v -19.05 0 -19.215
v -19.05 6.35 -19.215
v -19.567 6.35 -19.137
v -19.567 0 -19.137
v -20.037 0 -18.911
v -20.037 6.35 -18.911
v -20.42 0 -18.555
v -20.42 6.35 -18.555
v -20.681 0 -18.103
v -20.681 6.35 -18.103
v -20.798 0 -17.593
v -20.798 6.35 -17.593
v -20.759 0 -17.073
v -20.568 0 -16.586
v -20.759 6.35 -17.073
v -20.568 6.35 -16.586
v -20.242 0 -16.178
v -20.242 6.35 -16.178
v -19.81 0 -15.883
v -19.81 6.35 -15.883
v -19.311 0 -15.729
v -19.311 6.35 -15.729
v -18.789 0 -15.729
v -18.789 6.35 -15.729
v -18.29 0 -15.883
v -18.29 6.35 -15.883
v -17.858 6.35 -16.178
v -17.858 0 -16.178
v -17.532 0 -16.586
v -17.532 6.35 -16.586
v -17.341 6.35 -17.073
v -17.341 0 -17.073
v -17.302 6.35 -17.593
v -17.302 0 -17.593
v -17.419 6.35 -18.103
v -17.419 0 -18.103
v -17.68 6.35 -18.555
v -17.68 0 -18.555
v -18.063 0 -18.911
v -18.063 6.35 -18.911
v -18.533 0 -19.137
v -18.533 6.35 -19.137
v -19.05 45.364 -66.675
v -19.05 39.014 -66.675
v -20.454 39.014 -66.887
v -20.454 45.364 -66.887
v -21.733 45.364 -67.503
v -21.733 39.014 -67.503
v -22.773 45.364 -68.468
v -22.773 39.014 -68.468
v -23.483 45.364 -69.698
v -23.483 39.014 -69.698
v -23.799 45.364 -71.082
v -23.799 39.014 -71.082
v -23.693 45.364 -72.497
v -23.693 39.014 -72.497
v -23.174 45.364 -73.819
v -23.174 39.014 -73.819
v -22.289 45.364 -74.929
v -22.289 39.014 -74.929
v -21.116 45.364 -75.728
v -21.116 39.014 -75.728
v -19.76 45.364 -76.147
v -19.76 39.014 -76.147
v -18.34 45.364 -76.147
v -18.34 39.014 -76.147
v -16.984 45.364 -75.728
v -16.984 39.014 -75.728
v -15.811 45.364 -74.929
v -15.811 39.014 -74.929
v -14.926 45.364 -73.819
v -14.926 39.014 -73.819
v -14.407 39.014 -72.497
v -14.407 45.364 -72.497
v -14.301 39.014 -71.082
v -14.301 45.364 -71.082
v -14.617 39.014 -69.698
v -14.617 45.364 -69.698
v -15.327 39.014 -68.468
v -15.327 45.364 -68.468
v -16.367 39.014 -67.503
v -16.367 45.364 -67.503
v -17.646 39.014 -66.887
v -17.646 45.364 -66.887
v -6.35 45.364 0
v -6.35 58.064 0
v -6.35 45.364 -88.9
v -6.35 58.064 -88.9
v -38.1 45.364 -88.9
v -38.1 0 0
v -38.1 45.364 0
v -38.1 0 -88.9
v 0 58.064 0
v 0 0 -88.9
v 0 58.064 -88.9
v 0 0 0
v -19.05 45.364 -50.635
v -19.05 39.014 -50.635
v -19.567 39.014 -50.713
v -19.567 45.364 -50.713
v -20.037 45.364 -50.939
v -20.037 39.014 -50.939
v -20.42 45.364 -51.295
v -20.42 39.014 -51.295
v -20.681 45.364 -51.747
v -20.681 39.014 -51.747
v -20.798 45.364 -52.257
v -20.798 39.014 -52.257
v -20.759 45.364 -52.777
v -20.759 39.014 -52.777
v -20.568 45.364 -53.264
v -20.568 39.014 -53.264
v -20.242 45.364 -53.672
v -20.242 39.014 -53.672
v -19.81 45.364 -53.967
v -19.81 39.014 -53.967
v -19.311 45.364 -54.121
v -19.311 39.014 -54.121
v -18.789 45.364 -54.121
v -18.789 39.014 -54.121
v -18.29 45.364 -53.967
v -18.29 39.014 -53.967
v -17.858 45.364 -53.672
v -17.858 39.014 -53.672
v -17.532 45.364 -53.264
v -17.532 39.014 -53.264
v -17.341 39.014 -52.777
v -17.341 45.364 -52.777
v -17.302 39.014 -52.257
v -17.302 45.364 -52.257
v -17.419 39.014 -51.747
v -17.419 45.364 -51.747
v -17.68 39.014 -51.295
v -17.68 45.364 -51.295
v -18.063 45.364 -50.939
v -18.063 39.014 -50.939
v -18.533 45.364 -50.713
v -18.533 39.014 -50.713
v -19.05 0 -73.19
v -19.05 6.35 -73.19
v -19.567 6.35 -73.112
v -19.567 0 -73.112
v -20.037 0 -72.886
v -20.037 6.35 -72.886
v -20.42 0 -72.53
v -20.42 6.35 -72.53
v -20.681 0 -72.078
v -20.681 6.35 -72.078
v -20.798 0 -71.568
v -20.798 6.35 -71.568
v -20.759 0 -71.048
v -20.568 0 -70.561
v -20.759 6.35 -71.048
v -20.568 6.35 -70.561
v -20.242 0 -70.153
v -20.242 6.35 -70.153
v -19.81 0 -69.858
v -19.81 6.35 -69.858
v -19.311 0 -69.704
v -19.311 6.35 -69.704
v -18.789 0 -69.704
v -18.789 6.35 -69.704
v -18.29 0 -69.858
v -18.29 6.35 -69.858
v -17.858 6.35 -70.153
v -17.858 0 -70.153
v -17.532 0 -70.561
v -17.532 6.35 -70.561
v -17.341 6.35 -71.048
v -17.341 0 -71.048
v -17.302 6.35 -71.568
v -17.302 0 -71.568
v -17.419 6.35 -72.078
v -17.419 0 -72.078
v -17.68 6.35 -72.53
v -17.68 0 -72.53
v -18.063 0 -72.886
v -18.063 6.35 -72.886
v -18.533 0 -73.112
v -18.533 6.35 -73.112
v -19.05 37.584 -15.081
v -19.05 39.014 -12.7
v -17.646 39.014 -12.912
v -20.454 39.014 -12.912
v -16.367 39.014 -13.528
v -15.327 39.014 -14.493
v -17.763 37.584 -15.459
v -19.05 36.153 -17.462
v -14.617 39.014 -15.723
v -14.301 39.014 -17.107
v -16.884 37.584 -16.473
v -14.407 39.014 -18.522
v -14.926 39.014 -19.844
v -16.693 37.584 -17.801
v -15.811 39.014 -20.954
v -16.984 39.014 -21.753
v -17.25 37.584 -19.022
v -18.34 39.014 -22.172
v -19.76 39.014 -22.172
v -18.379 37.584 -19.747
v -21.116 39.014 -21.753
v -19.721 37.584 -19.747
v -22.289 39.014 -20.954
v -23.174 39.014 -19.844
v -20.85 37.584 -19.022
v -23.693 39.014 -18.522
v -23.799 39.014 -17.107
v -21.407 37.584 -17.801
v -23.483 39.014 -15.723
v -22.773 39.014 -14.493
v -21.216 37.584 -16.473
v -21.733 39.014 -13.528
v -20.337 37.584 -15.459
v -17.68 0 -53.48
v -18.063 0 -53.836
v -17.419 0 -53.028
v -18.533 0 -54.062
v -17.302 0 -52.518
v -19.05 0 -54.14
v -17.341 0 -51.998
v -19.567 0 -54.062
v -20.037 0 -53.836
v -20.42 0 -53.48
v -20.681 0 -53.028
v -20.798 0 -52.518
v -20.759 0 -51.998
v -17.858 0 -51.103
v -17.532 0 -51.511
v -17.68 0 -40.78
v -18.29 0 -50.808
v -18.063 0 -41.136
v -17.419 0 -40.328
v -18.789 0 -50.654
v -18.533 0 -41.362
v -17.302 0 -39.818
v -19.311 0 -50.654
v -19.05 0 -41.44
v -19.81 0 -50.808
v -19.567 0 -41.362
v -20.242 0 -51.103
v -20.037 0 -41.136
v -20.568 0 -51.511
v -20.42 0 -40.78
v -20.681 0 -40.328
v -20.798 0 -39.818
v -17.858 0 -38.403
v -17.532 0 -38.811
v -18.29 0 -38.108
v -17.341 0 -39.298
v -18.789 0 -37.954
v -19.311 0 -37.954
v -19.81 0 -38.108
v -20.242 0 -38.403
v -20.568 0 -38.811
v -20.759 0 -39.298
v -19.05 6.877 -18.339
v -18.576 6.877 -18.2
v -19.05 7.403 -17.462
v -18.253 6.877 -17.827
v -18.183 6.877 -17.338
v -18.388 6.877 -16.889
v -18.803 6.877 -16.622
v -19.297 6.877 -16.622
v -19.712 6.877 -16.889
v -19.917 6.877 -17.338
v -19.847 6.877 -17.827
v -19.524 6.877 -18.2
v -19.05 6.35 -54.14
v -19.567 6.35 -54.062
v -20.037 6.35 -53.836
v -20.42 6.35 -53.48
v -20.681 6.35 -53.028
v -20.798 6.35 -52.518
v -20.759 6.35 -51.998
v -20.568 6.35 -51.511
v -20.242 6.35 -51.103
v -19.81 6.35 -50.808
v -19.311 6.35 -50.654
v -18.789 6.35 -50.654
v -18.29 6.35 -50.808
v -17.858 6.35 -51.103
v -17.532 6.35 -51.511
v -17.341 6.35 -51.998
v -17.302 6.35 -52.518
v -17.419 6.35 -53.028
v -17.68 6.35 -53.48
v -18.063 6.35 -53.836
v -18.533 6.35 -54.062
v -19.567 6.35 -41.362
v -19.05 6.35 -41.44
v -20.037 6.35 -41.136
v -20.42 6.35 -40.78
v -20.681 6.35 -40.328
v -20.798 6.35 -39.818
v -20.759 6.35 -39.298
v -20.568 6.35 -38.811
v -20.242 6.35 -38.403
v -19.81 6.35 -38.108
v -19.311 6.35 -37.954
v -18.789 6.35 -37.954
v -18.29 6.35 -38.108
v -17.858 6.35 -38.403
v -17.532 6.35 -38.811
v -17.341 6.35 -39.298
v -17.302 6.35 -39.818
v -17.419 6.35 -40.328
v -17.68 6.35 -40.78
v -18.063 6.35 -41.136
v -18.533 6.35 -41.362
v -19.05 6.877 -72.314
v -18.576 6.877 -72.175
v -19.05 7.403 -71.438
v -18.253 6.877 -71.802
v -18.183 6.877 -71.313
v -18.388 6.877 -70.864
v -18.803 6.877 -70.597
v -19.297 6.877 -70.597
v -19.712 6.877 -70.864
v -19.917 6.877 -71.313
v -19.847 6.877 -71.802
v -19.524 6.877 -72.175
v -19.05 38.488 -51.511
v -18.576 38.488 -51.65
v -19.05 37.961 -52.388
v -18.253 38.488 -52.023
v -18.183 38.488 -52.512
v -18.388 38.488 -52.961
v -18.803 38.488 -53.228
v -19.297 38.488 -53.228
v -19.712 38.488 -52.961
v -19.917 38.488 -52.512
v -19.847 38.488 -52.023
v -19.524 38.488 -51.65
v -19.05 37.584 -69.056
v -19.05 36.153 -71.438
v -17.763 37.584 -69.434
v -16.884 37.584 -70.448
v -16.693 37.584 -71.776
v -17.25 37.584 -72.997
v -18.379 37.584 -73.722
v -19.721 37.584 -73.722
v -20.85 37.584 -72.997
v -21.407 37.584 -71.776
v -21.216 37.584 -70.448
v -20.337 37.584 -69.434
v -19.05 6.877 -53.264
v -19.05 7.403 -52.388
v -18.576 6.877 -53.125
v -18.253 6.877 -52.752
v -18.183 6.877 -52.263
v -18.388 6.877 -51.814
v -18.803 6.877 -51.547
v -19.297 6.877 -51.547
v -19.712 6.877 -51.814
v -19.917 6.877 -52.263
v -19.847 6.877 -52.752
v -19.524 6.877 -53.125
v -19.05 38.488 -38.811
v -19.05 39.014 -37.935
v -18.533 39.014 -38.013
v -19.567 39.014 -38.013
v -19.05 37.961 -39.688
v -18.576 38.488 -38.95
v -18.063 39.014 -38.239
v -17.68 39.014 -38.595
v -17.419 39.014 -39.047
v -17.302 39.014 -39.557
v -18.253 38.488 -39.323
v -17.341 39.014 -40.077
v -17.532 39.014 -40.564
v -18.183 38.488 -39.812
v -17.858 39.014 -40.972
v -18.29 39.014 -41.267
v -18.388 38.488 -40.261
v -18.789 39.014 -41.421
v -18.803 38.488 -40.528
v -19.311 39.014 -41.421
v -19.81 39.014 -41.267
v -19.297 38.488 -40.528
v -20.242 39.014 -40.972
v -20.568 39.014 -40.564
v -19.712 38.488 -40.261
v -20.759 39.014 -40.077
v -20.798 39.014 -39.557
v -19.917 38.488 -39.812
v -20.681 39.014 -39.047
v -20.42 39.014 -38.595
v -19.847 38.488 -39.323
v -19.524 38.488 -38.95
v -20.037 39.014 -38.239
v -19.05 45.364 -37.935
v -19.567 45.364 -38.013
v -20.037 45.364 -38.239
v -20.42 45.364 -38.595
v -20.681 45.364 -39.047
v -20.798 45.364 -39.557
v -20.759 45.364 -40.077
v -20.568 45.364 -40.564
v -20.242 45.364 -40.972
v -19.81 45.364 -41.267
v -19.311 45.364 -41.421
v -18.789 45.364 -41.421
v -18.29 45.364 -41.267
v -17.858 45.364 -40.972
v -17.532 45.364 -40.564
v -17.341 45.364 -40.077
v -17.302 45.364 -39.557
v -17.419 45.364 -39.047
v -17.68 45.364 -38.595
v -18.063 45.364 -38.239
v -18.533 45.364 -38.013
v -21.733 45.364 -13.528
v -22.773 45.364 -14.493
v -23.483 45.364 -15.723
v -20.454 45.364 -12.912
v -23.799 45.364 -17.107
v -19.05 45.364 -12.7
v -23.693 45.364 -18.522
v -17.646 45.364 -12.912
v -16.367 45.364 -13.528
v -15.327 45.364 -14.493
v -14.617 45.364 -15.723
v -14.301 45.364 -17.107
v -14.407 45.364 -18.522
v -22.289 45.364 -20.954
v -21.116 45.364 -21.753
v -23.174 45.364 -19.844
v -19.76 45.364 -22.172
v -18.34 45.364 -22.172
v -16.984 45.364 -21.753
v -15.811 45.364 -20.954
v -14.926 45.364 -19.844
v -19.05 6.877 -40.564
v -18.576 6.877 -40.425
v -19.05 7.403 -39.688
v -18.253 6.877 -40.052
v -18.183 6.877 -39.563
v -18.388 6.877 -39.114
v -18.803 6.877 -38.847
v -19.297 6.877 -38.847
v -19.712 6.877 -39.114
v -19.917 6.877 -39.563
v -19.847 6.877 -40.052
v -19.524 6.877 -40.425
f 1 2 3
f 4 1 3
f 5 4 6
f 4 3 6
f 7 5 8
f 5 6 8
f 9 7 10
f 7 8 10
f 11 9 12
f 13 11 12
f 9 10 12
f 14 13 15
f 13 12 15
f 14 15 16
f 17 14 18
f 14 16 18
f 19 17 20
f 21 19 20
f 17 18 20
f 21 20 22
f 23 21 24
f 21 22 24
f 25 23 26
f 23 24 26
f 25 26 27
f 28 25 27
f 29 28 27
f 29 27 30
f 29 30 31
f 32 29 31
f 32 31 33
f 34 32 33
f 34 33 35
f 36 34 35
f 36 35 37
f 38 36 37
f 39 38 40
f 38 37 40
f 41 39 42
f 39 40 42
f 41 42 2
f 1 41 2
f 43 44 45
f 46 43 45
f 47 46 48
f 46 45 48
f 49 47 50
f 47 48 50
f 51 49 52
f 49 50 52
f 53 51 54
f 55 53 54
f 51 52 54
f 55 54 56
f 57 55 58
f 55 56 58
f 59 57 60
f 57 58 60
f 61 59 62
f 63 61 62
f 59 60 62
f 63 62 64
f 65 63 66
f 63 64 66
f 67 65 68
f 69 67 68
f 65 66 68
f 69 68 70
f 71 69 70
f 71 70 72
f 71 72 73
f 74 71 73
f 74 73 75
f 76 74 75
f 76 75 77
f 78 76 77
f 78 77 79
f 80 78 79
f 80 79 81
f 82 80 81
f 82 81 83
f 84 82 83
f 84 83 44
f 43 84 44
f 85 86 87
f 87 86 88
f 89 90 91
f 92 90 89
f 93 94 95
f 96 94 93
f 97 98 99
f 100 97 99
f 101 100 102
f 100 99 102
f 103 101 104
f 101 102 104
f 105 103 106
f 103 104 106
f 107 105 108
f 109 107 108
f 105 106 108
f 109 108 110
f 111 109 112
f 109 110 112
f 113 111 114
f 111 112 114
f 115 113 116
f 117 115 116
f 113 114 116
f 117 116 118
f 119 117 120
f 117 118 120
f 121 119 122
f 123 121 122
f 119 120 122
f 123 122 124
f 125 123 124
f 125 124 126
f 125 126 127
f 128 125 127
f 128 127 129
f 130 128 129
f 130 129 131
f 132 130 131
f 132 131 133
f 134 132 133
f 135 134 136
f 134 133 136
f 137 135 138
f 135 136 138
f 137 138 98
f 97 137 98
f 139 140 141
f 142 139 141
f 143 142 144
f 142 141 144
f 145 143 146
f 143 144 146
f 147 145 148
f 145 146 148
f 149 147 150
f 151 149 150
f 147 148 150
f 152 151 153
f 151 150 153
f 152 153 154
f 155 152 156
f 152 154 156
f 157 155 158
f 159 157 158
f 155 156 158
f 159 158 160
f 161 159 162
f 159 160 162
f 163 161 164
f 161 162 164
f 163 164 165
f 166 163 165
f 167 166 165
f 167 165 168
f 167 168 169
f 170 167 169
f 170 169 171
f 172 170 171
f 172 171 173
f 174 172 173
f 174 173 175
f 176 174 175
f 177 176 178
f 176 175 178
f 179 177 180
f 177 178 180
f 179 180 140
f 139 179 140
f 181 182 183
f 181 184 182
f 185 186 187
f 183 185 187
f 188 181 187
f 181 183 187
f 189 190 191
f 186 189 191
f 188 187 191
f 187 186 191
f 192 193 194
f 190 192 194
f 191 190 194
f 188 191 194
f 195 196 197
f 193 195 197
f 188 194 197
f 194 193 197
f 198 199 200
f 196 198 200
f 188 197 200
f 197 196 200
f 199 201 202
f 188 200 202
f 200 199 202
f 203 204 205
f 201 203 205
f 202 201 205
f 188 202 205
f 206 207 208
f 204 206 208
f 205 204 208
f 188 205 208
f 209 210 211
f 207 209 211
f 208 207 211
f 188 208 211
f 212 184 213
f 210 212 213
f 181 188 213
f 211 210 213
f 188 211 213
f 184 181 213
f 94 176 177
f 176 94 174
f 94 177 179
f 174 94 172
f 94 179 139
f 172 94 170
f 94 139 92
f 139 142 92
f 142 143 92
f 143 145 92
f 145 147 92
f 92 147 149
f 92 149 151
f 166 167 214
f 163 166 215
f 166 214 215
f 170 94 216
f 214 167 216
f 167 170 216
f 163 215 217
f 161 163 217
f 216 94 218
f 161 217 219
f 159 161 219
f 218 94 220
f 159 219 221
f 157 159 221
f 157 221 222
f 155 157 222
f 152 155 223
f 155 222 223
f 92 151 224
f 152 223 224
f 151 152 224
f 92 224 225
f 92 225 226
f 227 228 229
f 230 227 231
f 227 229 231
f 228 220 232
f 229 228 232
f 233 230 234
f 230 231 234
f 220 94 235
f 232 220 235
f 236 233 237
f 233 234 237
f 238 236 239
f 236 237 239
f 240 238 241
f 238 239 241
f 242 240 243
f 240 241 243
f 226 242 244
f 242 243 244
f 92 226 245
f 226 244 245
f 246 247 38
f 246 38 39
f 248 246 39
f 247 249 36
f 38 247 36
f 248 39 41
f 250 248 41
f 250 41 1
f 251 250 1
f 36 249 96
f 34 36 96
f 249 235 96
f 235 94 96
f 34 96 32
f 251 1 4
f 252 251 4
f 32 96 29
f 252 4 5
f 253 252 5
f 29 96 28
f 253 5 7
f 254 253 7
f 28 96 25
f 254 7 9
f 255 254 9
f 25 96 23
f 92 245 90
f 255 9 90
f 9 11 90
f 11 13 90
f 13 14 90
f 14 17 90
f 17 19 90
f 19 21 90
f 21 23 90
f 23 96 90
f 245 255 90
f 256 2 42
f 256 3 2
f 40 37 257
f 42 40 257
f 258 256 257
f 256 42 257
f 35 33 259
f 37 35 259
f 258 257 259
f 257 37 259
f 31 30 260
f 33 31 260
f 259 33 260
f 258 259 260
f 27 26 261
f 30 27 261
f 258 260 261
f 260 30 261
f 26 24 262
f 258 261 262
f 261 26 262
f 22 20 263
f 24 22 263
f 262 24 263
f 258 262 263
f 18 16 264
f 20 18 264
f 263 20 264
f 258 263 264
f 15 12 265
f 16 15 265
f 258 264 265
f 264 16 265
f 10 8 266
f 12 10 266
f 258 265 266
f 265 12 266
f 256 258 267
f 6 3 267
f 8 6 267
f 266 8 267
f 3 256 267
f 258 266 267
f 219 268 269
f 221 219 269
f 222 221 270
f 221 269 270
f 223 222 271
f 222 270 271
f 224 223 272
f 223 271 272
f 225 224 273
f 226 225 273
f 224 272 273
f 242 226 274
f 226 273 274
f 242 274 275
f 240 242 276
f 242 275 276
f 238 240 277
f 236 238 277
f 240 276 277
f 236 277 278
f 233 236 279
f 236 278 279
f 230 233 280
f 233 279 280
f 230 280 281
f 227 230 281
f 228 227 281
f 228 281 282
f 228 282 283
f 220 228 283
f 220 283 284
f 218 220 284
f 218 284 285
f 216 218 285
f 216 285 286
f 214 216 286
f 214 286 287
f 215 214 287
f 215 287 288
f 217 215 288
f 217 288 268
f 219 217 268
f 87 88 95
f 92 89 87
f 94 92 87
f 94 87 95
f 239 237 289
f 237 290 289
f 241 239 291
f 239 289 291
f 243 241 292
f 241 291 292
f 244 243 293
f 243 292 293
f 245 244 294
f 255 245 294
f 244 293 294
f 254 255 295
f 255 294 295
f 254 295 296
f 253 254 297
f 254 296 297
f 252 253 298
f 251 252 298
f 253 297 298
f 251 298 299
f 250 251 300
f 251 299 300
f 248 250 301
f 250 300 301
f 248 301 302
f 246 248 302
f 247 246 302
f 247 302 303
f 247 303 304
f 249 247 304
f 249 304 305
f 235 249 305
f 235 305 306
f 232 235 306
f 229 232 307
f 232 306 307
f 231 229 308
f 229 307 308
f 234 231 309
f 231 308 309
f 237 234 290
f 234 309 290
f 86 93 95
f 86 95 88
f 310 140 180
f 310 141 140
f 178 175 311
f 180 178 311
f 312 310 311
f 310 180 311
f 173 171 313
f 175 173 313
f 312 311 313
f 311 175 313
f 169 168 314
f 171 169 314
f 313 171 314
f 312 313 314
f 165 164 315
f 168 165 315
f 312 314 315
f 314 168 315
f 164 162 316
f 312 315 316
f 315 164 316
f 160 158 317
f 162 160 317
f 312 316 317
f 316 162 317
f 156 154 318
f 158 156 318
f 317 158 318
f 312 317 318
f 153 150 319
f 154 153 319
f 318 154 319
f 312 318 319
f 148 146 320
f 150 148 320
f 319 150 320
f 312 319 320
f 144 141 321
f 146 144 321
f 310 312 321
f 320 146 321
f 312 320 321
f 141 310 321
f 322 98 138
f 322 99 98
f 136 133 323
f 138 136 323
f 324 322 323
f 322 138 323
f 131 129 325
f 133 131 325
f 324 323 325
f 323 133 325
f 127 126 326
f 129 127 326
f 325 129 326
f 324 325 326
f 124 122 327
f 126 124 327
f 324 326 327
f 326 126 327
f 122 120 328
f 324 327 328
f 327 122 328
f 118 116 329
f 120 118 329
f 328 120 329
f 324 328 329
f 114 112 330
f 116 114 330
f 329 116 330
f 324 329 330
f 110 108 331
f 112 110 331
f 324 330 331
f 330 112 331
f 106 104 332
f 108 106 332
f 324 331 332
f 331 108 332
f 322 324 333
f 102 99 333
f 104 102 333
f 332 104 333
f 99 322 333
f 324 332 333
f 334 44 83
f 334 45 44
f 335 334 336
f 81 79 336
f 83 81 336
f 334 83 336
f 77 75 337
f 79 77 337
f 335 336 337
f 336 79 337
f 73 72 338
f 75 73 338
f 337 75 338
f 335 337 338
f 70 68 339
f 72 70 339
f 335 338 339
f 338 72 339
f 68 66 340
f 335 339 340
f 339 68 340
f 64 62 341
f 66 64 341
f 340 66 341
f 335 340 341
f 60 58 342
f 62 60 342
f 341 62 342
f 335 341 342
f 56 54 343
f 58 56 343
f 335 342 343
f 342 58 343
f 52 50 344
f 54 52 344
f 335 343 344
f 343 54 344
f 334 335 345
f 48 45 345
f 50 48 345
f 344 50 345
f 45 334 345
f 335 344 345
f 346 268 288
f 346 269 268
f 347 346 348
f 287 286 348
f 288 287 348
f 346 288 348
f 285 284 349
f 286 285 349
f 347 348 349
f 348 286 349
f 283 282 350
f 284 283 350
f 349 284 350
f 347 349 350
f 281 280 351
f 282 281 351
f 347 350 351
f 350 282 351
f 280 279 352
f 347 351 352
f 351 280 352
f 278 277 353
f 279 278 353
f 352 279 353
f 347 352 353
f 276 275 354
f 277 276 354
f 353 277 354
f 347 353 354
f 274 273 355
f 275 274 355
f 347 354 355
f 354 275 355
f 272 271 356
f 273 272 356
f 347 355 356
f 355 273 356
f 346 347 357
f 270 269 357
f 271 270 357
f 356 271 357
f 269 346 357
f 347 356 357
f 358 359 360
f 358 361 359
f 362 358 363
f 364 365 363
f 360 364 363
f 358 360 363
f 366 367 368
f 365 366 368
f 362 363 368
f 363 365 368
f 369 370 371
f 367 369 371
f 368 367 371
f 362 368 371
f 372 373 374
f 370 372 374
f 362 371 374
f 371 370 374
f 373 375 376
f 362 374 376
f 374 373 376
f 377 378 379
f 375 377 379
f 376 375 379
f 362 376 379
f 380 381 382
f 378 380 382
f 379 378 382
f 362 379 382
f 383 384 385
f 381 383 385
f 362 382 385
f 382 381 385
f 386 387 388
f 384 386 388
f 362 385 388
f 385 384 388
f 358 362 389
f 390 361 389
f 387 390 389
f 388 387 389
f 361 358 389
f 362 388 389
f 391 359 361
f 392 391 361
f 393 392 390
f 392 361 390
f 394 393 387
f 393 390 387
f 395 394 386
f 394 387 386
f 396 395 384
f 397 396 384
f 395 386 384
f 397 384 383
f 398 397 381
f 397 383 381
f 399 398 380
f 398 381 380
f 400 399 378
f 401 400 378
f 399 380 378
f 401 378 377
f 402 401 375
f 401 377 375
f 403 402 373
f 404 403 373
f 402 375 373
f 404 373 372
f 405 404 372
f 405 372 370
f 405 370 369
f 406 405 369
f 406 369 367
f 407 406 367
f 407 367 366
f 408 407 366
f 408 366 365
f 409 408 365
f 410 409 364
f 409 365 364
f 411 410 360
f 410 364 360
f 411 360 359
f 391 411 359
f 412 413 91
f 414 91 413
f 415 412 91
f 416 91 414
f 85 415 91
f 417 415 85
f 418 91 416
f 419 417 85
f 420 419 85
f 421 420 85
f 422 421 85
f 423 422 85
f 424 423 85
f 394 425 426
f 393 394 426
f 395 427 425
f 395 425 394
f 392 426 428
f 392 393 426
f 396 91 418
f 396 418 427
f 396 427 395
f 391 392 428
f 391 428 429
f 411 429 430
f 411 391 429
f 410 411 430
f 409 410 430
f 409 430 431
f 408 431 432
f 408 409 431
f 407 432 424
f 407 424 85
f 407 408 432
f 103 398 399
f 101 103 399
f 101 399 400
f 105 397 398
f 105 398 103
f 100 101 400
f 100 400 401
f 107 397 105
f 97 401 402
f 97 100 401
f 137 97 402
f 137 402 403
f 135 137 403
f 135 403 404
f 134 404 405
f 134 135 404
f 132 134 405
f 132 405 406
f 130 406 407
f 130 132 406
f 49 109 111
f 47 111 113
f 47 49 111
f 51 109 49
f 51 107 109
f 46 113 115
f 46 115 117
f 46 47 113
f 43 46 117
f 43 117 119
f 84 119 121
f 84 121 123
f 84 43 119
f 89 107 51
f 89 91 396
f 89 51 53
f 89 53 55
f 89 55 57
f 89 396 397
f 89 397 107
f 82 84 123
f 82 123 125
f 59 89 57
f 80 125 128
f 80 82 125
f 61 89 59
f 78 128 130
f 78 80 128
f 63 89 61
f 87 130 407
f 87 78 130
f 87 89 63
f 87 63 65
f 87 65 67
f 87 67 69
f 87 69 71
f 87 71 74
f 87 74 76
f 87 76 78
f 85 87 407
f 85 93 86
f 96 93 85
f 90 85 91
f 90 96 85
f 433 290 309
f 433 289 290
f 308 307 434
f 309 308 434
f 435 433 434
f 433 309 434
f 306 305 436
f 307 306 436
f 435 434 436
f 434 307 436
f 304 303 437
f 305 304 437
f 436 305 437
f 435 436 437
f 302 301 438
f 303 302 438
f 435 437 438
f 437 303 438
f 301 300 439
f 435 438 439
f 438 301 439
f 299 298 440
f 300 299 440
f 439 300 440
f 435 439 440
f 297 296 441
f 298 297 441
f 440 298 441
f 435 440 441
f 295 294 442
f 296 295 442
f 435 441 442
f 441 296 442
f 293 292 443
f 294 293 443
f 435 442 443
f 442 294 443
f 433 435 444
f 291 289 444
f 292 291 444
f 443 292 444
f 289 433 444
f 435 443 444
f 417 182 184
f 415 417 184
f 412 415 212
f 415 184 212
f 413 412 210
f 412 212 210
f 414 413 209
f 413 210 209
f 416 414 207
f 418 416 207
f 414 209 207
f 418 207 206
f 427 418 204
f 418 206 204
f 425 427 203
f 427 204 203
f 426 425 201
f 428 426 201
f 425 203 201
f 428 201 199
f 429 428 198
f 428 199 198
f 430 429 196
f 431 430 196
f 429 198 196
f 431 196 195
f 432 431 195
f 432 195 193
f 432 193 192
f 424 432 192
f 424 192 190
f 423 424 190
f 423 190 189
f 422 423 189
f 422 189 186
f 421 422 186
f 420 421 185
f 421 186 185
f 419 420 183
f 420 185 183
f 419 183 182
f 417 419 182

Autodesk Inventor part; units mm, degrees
ref_plane "YZ Plane" through (0, 0, 0) normal (1, 0, 0) x (0, 1, 0)
ref_plane "XZ Plane" through (0, 0, 0) normal (0, 1, 0) x (-1, 0, 0)
ref_plane "XY Plane" through (0, 0, 0) normal (0, 0, 1) x (1, 0, 0)
sketch "Sketch1" plane through (0, 0, 0) normal (0, 1, 0) x (-1, 0, 0)
  line L0 (0, 0) -> (38.1, 0)
  line L1 (38.1, 0) -> (38.1, -88.9)
  line L2 (38.1, -88.9) -> (0, -88.9)
  line L3 (0, -88.9) -> (0, 0)
  dimension "d0" = 88.9
  dimension "d1" = 38.1
extrude "Extrusion1" add sketch "Sketch1" along normal blind 58.0644
sketch "Sketch6" plane through (0, 58.0644, 0) normal (0, 1, 0) x (1, 0, 0)
  line L0 (-38.1, 0) -> (0, 0) projected
  line L1 (0, 0) -> (0, 88.9) projected
  line L2 (0, 88.9) -> (-38.1, 88.9) projected
  line L3 (-38.1, 88.9) -> (-38.1, 0) projected
  line L4 (-38.1, 0) -> (-6.35, 0)
  line L5 (-6.35, 0) -> (-6.35, 88.9)
  line L6 (-6.35, 88.9) -> (-38.1, 88.9)
  line L7 (-38.1, 88.9) -> (-38.1, 0)
  dimension "d38" = 0
  dimension "d39" = 31.75
  dimension "d40" = 0
  dimension "d41" = 88.9
extrude "Extrusion5" cut sketch "Sketch6" against normal blind 12.7 contours L3 L2 L5 L0
sketch "Sketch7" plane through (0, 45.3644, 0) normal (0, 1, 0) x (1, 0, 0)
  arc A0 (-20.2095, 23.7057) -> (-20.2095, 11.2193) centre (-19.05, 17.4625) ccw projected
  line L0 (-26.5557, 23.7057) -> (-20.2095, 23.7057) projected
  line L1 (-26.5557, 11.2193) -> (-26.5557, 23.7057) projected
  line L2 (-26.5557, 11.2193) -> (-20.2095, 11.2193) projected
  arc A1 (-17.8905, 11.2193) -> (-17.8905, 23.7057) centre (-19.05, 17.4625) ccw projected
  line L3 (-17.8905, 11.2193) -> (-11.5443, 11.2193) projected
  line L4 (-11.5443, 23.7057) -> (-11.5443, 11.2193) projected
  line L5 (-17.8905, 23.7057) -> (-11.5443, 23.7057) projected
  arc A2 (-25.2932, 70.278) -> (-12.8068, 70.278) centre (-19.05, 71.4375) ccw projected
  line L6 (-25.2932, 70.278) -> (-25.2932, 63.9318) projected
  line L7 (-12.8068, 63.9318) -> (-25.2932, 63.9318) projected
  line L8 (-12.8068, 70.278) -> (-12.8068, 63.9318) projected
  arc A3 (-12.8068, 72.597) -> (-25.2932, 72.597) centre (-19.05, 71.4375) ccw projected
  line L9 (-12.8068, 78.9432) -> (-12.8068, 72.597) projected
  line L10 (-25.2932, 78.9432) -> (-12.8068, 78.9432) projected
  line L11 (-25.2932, 78.9432) -> (-25.2932, 72.597) projected
  circle A4 centre (-19.05, 52.3875) radius 1.7526 projected
  circle A5 centre (-19.05, 39.6875) radius 1.7526 projected
  point P0 (0, 0)
hole "Hole2" at (-19.05, 45.3644, -71.4375) at (-19.05, 45.3644, -17.4625) direction (0, -1, 0) diameter 9.525 depth 6.35 tip angle 118
sketch "Sketch8" plane through (0, 45.3644, 0) normal (0, 1, 0) x (1, 0, 0)
  circle A0 centre (-19.05, 52.3875) radius 1.7526 projected
  circle A1 centre (-19.05, 39.6875) radius 1.7526 projected
  point P0 (0, 0)
hole "Hole3" at (-19.05, 45.3644, -52.3875) at (-19.05, 45.3644, -39.6875) direction (0, -1, 0) diameter 3.5052 depth 6.35 tip angle 118
sketch "Sketch9" plane through (0, 0, 0) normal (0, -1, 0) x (1, 0, 0)
  line L0 (0, 0) -> (-38.1, 0) projected
  line L1 (-38.1, 0) -> (-38.1, -88.9) projected
  line L2 (-38.1, -88.9) -> (0, -88.9) projected
  line L3 (0, -88.9) -> (0, 0) projected
  circle A0 centre (-19.05, -17.4625) radius 4.7625 projected
  circle A1 centre (-19.05, -71.4375) radius 4.7625 projected
  circle A2 centre (-19.05, -39.6875) radius 1.7526 projected
  circle A3 centre (-19.05, -52.3875) radius 1.7526 projected
  circle A4 centre (-19.05, -39.6875) radius 1.7526 projected
  circle A5 centre (-19.05, -52.3875) radius 1.7526 projected
hole "Hole4" at (-19.05, 0, -17.4625) at (-19.05, 0, -71.4375) at (-19.05, 0, -39.6875) at (-19.05, 0, -52.3875) direction (0, 1, 0) diameter 3.5052 depth 6.35 tip angle 118
thread "Thread1" size "6-32 UNC" class "2B" standard "ANSI Unified Screw Threads" full length
thread "Thread2" size "6-32 UNC" class "2B" standard "ANSI Unified Screw Threads" full length
thread "Thread3" size "6-32 UNC" class "2B" standard "ANSI Unified Screw Threads" full length
thread "Thread4" size "6-32 UNC" class "2B" standard "ANSI Unified Screw Threads" full length
thread "Thread5" size "6-32 UNC" class "2B" standard "ANSI Unified Screw Threads" full length
thread "Thread6" size "6-32 UNC" class "2B" standard "ANSI Unified Screw Threads" full length
properties part number "TSV-Support"
